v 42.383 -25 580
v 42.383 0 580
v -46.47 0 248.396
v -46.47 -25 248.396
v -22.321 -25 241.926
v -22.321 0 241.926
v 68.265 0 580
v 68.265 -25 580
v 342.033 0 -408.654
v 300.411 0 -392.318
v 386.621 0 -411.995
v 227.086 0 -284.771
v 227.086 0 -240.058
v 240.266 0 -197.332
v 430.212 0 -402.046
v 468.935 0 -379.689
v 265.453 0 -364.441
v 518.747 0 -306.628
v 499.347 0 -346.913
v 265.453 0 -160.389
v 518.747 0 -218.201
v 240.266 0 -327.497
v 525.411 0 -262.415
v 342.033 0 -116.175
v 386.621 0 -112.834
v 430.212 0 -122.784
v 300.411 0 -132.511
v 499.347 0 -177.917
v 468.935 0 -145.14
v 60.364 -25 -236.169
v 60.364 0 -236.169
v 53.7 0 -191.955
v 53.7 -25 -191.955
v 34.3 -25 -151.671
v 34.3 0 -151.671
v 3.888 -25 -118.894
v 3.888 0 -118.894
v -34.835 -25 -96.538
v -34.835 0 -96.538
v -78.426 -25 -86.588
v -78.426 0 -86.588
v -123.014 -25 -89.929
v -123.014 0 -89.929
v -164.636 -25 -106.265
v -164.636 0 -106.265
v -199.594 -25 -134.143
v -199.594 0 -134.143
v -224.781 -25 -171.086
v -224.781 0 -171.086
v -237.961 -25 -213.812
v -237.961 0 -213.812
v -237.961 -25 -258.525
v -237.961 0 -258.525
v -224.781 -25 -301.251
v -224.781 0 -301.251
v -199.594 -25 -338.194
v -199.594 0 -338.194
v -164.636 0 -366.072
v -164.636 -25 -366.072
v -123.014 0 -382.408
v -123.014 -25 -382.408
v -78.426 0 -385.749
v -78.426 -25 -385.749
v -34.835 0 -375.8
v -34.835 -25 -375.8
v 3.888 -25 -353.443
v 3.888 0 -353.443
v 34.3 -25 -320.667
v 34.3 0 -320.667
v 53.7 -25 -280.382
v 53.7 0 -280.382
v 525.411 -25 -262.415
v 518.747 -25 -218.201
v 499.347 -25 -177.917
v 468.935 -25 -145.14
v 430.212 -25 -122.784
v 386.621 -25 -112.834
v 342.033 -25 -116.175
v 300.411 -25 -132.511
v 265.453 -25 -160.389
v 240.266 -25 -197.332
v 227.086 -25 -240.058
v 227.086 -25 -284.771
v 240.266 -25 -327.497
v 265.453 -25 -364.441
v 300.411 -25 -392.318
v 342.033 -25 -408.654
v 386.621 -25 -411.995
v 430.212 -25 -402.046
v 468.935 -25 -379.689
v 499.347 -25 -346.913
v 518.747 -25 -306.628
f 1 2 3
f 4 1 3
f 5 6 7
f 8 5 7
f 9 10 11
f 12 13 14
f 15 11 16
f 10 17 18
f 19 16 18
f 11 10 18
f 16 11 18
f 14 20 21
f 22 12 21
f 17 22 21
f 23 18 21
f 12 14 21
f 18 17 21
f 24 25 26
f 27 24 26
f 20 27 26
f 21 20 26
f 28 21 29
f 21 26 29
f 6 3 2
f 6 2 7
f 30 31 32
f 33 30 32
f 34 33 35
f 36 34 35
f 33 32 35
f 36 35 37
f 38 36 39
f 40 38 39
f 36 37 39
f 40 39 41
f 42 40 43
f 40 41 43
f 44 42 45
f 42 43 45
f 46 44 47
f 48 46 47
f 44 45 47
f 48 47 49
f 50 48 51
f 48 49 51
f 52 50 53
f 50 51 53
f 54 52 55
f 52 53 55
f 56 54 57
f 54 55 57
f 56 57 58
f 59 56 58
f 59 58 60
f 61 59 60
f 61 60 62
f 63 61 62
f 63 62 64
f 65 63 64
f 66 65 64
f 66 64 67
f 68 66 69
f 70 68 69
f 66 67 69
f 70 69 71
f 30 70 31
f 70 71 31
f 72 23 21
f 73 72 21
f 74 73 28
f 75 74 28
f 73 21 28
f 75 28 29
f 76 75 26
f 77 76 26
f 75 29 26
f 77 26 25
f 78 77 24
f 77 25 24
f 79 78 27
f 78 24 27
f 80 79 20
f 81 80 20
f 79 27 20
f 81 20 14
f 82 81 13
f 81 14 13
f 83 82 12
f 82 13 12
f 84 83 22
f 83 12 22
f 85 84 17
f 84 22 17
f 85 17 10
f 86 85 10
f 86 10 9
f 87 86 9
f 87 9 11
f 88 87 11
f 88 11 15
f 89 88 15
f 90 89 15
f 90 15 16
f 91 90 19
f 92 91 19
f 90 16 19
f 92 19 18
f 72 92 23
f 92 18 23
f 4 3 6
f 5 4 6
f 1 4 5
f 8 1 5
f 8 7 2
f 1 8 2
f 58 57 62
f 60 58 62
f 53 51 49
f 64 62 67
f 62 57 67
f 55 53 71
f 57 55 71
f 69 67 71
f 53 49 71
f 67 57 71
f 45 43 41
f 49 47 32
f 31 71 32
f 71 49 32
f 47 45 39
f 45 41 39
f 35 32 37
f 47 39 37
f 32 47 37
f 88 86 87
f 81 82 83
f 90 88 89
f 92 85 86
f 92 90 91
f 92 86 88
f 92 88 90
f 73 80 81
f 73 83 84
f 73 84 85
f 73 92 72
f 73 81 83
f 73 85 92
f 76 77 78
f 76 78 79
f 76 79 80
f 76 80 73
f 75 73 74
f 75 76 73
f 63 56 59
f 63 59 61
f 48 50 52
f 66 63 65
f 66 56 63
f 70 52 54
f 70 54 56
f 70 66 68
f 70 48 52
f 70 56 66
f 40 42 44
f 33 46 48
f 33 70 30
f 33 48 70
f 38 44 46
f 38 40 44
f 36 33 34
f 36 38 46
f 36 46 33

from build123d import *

# Parameters (mm, degrees)
F0_R     = 150
F1_DEPTH = 25


with BuildPart() as f1:
    # F0 (on Front) → F1 (new body)
    with BuildSketch(Plane.XZ):
        Polygon((44.641016, 580), (42.383346, 580), (-46.469561, 248.396437), (-22.321415, 241.925961), (68.26525, 580), align=None)
        with Locations((-89.635961, -236.168578)):
            Circle(F0_R)
        with Locations((375.411063, -262.414664)):
            Circle(F0_R)
    extrude(amount=F1_DEPTH)


solid = f1.part
